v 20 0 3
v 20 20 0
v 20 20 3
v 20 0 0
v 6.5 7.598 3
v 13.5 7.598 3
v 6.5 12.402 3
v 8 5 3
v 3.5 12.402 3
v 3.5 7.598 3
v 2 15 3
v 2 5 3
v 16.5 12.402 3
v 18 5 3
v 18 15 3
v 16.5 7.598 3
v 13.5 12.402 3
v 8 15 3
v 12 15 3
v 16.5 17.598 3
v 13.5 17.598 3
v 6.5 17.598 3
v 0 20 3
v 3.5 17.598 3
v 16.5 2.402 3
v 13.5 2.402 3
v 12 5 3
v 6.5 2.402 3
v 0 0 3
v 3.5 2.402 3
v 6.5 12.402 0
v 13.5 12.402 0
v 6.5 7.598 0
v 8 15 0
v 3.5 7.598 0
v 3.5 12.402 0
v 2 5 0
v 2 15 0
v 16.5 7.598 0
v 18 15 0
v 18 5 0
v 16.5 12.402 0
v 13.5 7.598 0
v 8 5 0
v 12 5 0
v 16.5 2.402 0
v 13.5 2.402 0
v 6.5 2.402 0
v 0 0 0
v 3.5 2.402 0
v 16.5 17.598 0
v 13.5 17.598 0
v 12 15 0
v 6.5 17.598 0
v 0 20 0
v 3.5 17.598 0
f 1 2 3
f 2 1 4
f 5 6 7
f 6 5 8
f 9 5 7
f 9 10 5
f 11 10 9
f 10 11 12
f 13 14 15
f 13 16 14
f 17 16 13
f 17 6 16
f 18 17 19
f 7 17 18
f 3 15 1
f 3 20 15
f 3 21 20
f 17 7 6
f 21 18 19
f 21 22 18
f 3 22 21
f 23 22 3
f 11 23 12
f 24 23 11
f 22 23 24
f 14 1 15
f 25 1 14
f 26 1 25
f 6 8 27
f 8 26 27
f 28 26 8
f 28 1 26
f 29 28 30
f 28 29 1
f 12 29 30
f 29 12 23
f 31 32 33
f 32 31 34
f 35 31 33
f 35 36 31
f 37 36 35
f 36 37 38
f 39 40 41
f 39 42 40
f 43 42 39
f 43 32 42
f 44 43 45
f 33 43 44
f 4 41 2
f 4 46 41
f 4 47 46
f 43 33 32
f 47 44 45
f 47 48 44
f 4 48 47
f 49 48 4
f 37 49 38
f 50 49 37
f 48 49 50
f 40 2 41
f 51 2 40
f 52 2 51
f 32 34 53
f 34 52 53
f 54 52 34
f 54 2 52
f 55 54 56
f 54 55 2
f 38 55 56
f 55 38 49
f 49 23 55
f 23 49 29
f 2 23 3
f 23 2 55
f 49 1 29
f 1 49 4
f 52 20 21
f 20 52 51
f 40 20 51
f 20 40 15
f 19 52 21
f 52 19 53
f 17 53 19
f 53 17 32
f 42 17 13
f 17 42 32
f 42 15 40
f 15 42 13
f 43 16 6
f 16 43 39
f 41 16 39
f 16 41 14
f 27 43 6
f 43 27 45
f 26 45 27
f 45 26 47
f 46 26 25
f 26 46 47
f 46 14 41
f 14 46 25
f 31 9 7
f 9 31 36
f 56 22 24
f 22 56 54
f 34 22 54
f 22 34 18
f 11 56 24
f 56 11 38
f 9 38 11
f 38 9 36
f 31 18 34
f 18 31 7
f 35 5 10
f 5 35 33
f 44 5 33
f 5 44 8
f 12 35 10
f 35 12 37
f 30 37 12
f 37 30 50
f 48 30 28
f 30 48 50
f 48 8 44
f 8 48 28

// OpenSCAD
difference() {
translate([10, 10, 1.5]) cube([20, 20, 3], center = true);
    translate ([15, 15, 0]) cylinder(h = 3, r = 3, $fn = 6);
    translate ([15, 5, 0]) cylinder(h = 3, r = 3, $fn = 6);
    translate ([5, 15, 0]) cylinder(h = 3, r = 3, $fn = 6);
    translate ([5, 5, 0]) cylinder(h = 3, r = 3, $fn = 6);
}
